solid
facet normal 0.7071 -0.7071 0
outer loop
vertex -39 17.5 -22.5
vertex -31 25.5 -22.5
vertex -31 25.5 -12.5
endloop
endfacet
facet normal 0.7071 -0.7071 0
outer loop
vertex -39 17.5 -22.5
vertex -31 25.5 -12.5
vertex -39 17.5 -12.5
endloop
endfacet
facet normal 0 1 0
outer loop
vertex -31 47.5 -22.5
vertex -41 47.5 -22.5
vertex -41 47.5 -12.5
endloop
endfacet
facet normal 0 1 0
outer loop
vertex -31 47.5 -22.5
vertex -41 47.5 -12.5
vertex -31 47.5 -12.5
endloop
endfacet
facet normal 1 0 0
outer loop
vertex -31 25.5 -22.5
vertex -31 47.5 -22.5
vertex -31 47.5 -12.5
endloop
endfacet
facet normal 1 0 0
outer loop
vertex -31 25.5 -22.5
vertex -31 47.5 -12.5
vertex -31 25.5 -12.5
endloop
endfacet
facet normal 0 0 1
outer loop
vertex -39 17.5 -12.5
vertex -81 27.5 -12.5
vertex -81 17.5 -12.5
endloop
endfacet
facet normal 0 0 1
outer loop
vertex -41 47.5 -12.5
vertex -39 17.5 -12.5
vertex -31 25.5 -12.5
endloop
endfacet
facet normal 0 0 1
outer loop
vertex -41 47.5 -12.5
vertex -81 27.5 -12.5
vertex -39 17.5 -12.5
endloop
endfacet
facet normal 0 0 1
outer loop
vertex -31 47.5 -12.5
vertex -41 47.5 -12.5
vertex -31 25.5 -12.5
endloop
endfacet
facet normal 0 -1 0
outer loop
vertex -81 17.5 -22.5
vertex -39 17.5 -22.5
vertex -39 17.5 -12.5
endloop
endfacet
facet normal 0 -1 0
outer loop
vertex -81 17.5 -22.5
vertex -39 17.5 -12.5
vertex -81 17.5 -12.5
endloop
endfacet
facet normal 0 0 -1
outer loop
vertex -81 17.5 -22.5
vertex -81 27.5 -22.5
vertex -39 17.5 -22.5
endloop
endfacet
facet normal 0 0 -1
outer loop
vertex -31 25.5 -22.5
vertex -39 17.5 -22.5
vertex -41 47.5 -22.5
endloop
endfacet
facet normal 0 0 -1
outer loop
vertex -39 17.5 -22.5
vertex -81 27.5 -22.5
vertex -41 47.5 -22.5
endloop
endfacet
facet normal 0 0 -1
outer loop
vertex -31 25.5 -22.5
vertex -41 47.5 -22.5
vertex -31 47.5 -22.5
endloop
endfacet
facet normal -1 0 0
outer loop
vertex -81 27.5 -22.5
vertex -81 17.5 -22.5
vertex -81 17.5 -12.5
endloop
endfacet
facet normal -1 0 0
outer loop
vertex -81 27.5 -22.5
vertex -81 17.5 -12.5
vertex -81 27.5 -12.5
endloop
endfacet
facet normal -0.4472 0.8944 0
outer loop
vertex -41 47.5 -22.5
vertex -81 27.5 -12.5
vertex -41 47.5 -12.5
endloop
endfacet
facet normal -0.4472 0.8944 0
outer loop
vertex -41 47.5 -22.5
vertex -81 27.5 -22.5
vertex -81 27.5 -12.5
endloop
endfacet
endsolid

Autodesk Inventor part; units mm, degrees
ref_plane "YZ Plane" through (0, 0, 0) normal (1, 0, 0) x (0, 1, 0)
ref_plane "XZ Plane" through (0, 0, 0) normal (0, 1, 0) x (-1, 0, 0)
ref_plane "XY Plane" through (0, 0, 0) normal (0, 0, 1) x (1, 0, 0)
ref_plane "Work Plane1" through (0, 0, -17.5) normal (0, 0, 1) x (1, 0, 0)
sketch "Sketch1" plane through (0, 0, -17.5) normal (0, 0, 1) x (1, 0, 0)
  line L0 (-31, 0) -> (-31, 120) construction
  line L1 (3, 17.5) -> (-715, 17.5) construction
  line L2 (-39, 17.5) -> (-81, 17.5)
  line L3 (-81, 17.5) -> (-81, 27.5)
  line L4 (-41, 47.5) -> (-31, 47.5)
  line L5 (-31, 47.5) -> (-31, 25.5)
  line L6 (-31, 25.5) -> (-39, 17.5)
  line L7 (-81, 27.5) -> (-41, 47.5)
  point P0 (0, 0)
  point P1 (-31, 17.5)
  point P2 (-81, 47.5)
  dimension "d0" = 50
  dimension "d1" = 30
  dimension "d2" = 8
  dimension "d3" = 8
  dimension "d4" = 20
  dimension "d5" = 40
extrude "Extrusion1" add sketch "Sketch1" along normal mid plane 10
equation "\"d3\" = d2"
properties part number "Gusset" material "Steel, Alloy"
